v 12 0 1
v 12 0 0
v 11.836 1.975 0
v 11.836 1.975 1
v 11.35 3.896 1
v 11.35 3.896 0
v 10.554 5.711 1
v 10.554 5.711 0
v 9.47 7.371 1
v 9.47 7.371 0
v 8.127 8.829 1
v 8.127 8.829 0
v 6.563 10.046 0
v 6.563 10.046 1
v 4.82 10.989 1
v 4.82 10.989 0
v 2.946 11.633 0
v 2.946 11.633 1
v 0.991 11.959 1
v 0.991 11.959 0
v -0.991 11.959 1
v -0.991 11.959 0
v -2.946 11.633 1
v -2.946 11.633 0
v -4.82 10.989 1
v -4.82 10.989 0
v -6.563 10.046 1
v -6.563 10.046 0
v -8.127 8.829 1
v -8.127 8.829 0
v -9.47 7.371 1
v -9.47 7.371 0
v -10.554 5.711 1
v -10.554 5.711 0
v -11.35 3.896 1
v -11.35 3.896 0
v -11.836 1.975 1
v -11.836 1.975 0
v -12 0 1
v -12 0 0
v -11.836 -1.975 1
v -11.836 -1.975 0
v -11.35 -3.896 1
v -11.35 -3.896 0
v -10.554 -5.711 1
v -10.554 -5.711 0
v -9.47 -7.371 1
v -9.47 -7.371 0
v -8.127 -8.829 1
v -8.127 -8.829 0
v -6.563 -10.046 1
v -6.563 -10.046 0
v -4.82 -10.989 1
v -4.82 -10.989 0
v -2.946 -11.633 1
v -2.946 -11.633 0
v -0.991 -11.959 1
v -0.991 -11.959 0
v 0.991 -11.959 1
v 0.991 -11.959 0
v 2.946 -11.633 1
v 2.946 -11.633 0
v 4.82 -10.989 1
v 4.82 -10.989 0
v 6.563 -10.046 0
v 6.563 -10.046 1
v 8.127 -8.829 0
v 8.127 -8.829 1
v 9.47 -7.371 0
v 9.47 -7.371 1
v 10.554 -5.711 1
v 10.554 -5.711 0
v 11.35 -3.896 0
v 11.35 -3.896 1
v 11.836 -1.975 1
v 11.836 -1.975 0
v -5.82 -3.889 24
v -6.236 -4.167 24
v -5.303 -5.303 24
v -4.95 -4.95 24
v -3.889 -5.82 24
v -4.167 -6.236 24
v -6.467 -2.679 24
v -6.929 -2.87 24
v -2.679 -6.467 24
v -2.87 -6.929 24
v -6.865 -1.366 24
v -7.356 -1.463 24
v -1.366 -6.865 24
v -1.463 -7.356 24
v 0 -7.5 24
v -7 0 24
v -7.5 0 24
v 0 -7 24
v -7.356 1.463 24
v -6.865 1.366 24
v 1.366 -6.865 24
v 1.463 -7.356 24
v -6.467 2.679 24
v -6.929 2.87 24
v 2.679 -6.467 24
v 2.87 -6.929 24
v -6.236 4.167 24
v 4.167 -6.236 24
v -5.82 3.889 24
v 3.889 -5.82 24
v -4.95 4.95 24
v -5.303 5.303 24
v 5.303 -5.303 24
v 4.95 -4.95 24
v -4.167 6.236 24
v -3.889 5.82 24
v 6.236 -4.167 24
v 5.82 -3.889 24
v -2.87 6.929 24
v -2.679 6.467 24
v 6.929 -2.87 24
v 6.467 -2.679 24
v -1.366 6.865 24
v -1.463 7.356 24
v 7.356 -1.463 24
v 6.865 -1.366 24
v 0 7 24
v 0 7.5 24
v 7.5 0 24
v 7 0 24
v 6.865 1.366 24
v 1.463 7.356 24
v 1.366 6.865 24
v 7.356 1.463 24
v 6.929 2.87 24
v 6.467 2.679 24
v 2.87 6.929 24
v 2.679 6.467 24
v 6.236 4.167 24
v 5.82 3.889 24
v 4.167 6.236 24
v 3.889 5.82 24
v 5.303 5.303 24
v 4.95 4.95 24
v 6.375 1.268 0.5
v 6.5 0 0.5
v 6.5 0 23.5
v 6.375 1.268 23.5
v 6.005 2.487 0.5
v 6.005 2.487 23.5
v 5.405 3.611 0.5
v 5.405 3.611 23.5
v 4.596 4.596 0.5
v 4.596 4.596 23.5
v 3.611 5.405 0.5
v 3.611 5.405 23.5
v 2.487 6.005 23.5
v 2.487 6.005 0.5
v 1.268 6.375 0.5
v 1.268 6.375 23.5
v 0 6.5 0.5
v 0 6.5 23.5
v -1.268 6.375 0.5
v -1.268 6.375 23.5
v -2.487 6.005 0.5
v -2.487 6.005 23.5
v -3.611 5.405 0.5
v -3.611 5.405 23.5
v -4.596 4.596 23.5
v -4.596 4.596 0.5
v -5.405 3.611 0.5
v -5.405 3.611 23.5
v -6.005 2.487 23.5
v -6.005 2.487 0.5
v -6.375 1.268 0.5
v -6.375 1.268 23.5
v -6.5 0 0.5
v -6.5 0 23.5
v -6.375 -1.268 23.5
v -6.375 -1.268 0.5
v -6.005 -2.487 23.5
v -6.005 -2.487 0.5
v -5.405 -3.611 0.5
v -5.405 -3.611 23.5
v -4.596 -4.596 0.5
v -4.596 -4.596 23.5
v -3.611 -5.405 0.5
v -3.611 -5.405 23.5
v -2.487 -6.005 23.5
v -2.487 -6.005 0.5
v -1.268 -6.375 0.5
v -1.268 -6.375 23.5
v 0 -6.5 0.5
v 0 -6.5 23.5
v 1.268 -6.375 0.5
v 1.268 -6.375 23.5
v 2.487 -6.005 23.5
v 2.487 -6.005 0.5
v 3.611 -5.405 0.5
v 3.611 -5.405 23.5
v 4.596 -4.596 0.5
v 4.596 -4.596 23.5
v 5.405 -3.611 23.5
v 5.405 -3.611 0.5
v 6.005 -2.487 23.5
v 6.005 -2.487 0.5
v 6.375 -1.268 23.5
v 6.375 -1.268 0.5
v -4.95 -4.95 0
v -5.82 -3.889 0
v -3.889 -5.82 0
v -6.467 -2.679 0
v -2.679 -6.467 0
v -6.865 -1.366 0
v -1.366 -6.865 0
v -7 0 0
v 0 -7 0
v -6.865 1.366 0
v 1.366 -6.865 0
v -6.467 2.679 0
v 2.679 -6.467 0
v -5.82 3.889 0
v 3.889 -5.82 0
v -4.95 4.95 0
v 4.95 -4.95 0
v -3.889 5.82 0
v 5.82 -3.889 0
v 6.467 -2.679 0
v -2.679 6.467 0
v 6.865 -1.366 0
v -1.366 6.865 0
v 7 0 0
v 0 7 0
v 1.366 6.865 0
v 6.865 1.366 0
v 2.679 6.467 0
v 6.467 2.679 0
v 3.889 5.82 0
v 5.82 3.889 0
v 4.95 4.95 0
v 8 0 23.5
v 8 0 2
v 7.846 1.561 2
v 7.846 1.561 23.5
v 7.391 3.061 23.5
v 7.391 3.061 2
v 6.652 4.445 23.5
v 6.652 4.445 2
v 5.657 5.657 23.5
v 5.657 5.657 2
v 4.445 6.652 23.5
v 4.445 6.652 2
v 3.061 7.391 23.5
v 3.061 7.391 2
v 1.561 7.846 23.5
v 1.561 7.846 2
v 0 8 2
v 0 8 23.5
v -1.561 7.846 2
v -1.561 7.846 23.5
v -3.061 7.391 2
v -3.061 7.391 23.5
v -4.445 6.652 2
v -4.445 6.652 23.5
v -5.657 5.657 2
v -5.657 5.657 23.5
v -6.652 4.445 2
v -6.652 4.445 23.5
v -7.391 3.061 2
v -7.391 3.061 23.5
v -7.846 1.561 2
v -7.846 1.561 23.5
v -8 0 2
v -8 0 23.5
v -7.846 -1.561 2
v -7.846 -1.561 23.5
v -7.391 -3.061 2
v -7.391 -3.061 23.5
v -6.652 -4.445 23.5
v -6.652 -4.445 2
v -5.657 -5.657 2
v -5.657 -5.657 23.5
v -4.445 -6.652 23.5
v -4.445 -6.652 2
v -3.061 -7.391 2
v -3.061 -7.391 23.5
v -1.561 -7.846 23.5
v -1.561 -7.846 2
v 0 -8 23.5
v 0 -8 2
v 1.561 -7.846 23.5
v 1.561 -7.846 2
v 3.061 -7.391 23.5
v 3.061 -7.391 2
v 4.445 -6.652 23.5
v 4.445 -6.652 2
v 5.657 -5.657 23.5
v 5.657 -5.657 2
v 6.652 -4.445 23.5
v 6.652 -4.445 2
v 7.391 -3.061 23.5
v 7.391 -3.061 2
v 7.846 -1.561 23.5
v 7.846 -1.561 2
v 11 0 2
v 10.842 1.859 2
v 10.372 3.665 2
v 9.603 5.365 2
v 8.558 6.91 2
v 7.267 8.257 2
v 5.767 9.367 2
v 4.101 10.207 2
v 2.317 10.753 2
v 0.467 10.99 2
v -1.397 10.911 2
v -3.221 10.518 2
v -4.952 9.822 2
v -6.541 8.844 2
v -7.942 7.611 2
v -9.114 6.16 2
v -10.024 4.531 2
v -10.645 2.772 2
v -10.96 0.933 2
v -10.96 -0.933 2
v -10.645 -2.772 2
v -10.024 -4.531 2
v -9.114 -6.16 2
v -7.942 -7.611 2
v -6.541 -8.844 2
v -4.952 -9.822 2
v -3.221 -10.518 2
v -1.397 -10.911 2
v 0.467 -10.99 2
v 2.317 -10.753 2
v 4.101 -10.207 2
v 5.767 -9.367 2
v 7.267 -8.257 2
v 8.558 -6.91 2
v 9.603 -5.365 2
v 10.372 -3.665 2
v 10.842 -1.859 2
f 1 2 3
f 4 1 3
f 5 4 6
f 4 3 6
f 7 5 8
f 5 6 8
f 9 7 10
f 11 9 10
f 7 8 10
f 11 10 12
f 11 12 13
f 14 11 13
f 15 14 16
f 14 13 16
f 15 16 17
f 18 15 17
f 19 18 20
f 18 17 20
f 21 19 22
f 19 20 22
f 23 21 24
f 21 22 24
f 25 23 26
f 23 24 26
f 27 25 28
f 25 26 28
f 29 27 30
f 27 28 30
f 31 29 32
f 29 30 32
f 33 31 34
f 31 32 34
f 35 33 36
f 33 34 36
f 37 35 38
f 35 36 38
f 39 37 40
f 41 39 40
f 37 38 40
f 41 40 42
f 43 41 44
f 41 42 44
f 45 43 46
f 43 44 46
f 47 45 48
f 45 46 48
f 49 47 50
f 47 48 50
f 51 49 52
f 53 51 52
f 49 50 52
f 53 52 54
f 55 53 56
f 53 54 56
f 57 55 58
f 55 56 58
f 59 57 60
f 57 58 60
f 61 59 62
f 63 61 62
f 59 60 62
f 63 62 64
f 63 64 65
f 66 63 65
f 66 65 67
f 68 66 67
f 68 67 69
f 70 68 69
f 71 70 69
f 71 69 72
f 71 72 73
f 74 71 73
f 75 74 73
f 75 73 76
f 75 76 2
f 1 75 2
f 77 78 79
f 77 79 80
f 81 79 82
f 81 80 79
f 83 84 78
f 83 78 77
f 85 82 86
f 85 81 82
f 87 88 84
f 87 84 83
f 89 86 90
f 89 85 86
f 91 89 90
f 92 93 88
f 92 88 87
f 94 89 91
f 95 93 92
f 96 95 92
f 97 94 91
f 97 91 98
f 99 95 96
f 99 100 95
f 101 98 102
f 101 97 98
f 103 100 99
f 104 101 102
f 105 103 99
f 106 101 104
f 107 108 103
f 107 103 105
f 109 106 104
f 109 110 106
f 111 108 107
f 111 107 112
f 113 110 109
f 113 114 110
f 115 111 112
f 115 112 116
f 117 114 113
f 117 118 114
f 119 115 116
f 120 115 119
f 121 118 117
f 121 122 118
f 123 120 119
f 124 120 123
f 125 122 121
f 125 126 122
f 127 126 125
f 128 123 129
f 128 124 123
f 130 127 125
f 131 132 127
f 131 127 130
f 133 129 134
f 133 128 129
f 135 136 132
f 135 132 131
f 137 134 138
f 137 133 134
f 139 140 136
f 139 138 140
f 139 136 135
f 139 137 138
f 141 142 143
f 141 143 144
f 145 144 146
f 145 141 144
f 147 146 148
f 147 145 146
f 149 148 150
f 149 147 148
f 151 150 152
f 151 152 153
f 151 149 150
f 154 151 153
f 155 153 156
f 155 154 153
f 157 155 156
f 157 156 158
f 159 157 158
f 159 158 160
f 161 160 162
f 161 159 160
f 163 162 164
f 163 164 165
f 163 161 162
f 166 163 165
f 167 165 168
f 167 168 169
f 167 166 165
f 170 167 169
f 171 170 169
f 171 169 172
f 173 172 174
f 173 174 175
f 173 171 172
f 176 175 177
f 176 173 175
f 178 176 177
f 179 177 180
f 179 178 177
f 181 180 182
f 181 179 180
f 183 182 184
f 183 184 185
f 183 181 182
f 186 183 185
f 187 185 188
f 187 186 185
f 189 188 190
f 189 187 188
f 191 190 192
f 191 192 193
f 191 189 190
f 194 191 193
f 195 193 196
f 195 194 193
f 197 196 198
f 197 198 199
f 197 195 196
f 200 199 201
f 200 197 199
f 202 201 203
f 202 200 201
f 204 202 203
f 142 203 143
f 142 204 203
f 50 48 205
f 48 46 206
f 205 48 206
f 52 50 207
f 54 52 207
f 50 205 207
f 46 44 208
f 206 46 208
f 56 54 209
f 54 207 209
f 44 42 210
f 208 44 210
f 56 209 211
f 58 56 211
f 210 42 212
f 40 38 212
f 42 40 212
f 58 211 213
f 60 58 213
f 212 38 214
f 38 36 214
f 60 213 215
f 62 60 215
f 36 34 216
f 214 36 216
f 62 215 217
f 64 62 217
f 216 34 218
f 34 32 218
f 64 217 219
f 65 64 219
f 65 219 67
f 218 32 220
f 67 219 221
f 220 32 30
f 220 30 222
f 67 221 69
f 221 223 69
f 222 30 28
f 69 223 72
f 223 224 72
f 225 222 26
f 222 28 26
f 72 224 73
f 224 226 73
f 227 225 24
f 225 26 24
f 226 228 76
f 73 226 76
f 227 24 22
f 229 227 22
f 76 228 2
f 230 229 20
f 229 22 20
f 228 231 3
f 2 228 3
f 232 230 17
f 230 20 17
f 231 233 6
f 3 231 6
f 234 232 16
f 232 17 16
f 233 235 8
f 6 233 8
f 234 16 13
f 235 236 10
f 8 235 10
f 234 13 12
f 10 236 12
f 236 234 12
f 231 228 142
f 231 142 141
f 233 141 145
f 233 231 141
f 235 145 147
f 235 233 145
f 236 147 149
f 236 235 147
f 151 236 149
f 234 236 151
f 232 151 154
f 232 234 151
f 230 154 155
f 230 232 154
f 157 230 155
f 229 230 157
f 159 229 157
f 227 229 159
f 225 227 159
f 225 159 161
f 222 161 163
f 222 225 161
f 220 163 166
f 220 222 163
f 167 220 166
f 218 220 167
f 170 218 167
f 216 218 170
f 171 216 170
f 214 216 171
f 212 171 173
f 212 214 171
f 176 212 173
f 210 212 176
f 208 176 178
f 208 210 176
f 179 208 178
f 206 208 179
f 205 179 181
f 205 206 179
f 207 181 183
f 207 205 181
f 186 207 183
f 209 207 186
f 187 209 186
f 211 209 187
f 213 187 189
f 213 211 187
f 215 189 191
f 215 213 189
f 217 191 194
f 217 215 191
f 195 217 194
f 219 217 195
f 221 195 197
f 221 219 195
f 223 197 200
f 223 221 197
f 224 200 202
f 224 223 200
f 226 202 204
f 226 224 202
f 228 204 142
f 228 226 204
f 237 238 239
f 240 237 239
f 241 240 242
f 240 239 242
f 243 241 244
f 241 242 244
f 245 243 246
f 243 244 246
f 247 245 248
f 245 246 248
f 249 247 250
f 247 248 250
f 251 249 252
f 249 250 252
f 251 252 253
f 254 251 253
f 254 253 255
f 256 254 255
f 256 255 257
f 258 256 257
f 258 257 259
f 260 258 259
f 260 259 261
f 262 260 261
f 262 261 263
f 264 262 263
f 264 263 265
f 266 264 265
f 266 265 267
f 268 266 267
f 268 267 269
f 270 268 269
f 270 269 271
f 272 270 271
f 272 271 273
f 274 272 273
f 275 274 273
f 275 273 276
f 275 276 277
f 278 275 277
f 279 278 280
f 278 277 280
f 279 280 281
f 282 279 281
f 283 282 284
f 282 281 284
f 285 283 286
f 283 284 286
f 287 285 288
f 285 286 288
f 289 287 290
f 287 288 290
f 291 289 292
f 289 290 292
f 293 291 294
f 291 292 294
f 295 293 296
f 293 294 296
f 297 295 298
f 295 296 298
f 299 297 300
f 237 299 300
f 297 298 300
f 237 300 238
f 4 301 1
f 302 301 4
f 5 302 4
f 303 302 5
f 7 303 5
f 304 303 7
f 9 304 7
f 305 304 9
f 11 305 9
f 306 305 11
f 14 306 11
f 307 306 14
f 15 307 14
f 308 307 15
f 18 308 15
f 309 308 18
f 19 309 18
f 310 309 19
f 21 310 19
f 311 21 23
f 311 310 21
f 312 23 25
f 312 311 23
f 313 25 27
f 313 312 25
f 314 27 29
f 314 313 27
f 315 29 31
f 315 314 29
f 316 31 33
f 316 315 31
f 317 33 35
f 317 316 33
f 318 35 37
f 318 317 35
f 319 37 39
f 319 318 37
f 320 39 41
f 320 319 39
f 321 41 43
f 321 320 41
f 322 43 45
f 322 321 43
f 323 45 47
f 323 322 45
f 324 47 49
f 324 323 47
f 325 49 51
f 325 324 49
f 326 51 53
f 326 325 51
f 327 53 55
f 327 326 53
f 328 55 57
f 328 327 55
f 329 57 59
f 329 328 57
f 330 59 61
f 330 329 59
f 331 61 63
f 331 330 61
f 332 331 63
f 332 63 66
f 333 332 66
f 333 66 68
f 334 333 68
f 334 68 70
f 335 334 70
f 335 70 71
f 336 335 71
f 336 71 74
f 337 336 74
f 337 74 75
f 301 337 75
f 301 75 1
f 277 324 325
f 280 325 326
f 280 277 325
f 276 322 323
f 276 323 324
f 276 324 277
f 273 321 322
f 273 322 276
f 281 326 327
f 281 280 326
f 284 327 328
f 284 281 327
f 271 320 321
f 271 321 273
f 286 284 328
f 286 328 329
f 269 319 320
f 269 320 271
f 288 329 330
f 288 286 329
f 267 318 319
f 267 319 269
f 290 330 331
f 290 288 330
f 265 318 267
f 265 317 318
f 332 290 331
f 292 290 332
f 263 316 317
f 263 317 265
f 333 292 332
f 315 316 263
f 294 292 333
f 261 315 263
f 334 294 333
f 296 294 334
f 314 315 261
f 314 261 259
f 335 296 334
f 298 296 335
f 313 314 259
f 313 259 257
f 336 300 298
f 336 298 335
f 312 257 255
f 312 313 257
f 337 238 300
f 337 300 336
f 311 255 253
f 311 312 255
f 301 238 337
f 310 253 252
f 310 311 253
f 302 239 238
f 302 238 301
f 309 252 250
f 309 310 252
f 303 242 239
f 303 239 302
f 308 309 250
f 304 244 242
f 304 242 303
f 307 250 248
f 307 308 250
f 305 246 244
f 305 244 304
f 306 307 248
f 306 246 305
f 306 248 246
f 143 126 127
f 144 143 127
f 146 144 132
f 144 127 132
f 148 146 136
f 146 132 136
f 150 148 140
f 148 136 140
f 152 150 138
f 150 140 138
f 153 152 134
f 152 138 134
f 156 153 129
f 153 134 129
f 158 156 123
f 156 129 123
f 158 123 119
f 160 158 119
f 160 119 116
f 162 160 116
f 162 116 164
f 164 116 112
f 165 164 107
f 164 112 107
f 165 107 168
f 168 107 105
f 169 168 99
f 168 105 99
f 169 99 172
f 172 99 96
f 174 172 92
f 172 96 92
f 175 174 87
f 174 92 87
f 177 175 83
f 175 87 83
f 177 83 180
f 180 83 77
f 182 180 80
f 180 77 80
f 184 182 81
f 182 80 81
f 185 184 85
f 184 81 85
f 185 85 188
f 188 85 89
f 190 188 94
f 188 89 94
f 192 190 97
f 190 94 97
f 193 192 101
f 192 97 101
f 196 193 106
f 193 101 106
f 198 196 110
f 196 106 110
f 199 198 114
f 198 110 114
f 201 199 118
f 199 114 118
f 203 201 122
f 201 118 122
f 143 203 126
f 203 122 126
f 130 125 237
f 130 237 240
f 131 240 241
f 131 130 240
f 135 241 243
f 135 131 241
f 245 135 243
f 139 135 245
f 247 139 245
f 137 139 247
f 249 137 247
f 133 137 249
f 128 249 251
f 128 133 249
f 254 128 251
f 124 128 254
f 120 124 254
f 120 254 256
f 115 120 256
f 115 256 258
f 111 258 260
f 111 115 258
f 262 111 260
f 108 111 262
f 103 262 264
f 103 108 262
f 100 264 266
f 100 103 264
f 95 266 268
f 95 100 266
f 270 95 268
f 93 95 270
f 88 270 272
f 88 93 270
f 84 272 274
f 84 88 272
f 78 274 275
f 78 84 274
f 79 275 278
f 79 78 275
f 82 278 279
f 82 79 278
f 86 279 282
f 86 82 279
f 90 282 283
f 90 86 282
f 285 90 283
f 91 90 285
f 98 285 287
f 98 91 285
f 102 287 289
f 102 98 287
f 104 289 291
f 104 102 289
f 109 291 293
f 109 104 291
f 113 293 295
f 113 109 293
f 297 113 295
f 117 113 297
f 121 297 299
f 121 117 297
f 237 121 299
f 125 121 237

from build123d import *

# Parameters (mm, degrees)
SKETCH_R        = 8
SKETCH_R_2      = 6.5
PAD_DEPTH       = 24
CHAMFER_SIZE    = 0.5
SKETCH001_R     = 12
SKETCH001_R_2   = 6.5
PAD001_DEPTH    = 2
CHAMFER001_SIZE = 0.5
CHAMFER002_SIZE = 1
CHAMFER003_SIZE = 0.5


with BuildPart() as part:
    # Sketch → Pad (new body)
    with BuildSketch(Plane.XY):
        Circle(SKETCH_R)
        Circle(SKETCH_R_2, mode=Mode.SUBTRACT)
    extrude(amount=PAD_DEPTH)

    # Chamfer
    chamfer_edges = [part.edges().sort_by_distance(p)[0] for p in [
        (-6.5, 0, 24),
    ]]
    chamfer(chamfer_edges, length=CHAMFER_SIZE)

    # Sketch001 → Pad001 (join)
    with BuildSketch(Plane.XY):
        Circle(SKETCH001_R)
        Circle(SKETCH001_R_2, mode=Mode.SUBTRACT)
    extrude(amount=PAD001_DEPTH)

    # Chamfer001
    chamfer001_edges = [part.edges().sort_by_distance(p)[0] for p in [
        (-6.5, 0, 0),
    ]]
    chamfer(chamfer001_edges, length=CHAMFER001_SIZE)

    # Chamfer002
    chamfer002_edges = [part.edges().sort_by_distance(p)[0] for p in [
        (-12, 0, 2),
    ]]
    chamfer(chamfer002_edges, length=CHAMFER002_SIZE)

    # Chamfer003
    chamfer003_edges = [part.edges().sort_by_distance(p)[0] for p in [
        (-8, 0, 24),
    ]]
    chamfer(chamfer003_edges, length=CHAMFER003_SIZE)


solid = part.part
